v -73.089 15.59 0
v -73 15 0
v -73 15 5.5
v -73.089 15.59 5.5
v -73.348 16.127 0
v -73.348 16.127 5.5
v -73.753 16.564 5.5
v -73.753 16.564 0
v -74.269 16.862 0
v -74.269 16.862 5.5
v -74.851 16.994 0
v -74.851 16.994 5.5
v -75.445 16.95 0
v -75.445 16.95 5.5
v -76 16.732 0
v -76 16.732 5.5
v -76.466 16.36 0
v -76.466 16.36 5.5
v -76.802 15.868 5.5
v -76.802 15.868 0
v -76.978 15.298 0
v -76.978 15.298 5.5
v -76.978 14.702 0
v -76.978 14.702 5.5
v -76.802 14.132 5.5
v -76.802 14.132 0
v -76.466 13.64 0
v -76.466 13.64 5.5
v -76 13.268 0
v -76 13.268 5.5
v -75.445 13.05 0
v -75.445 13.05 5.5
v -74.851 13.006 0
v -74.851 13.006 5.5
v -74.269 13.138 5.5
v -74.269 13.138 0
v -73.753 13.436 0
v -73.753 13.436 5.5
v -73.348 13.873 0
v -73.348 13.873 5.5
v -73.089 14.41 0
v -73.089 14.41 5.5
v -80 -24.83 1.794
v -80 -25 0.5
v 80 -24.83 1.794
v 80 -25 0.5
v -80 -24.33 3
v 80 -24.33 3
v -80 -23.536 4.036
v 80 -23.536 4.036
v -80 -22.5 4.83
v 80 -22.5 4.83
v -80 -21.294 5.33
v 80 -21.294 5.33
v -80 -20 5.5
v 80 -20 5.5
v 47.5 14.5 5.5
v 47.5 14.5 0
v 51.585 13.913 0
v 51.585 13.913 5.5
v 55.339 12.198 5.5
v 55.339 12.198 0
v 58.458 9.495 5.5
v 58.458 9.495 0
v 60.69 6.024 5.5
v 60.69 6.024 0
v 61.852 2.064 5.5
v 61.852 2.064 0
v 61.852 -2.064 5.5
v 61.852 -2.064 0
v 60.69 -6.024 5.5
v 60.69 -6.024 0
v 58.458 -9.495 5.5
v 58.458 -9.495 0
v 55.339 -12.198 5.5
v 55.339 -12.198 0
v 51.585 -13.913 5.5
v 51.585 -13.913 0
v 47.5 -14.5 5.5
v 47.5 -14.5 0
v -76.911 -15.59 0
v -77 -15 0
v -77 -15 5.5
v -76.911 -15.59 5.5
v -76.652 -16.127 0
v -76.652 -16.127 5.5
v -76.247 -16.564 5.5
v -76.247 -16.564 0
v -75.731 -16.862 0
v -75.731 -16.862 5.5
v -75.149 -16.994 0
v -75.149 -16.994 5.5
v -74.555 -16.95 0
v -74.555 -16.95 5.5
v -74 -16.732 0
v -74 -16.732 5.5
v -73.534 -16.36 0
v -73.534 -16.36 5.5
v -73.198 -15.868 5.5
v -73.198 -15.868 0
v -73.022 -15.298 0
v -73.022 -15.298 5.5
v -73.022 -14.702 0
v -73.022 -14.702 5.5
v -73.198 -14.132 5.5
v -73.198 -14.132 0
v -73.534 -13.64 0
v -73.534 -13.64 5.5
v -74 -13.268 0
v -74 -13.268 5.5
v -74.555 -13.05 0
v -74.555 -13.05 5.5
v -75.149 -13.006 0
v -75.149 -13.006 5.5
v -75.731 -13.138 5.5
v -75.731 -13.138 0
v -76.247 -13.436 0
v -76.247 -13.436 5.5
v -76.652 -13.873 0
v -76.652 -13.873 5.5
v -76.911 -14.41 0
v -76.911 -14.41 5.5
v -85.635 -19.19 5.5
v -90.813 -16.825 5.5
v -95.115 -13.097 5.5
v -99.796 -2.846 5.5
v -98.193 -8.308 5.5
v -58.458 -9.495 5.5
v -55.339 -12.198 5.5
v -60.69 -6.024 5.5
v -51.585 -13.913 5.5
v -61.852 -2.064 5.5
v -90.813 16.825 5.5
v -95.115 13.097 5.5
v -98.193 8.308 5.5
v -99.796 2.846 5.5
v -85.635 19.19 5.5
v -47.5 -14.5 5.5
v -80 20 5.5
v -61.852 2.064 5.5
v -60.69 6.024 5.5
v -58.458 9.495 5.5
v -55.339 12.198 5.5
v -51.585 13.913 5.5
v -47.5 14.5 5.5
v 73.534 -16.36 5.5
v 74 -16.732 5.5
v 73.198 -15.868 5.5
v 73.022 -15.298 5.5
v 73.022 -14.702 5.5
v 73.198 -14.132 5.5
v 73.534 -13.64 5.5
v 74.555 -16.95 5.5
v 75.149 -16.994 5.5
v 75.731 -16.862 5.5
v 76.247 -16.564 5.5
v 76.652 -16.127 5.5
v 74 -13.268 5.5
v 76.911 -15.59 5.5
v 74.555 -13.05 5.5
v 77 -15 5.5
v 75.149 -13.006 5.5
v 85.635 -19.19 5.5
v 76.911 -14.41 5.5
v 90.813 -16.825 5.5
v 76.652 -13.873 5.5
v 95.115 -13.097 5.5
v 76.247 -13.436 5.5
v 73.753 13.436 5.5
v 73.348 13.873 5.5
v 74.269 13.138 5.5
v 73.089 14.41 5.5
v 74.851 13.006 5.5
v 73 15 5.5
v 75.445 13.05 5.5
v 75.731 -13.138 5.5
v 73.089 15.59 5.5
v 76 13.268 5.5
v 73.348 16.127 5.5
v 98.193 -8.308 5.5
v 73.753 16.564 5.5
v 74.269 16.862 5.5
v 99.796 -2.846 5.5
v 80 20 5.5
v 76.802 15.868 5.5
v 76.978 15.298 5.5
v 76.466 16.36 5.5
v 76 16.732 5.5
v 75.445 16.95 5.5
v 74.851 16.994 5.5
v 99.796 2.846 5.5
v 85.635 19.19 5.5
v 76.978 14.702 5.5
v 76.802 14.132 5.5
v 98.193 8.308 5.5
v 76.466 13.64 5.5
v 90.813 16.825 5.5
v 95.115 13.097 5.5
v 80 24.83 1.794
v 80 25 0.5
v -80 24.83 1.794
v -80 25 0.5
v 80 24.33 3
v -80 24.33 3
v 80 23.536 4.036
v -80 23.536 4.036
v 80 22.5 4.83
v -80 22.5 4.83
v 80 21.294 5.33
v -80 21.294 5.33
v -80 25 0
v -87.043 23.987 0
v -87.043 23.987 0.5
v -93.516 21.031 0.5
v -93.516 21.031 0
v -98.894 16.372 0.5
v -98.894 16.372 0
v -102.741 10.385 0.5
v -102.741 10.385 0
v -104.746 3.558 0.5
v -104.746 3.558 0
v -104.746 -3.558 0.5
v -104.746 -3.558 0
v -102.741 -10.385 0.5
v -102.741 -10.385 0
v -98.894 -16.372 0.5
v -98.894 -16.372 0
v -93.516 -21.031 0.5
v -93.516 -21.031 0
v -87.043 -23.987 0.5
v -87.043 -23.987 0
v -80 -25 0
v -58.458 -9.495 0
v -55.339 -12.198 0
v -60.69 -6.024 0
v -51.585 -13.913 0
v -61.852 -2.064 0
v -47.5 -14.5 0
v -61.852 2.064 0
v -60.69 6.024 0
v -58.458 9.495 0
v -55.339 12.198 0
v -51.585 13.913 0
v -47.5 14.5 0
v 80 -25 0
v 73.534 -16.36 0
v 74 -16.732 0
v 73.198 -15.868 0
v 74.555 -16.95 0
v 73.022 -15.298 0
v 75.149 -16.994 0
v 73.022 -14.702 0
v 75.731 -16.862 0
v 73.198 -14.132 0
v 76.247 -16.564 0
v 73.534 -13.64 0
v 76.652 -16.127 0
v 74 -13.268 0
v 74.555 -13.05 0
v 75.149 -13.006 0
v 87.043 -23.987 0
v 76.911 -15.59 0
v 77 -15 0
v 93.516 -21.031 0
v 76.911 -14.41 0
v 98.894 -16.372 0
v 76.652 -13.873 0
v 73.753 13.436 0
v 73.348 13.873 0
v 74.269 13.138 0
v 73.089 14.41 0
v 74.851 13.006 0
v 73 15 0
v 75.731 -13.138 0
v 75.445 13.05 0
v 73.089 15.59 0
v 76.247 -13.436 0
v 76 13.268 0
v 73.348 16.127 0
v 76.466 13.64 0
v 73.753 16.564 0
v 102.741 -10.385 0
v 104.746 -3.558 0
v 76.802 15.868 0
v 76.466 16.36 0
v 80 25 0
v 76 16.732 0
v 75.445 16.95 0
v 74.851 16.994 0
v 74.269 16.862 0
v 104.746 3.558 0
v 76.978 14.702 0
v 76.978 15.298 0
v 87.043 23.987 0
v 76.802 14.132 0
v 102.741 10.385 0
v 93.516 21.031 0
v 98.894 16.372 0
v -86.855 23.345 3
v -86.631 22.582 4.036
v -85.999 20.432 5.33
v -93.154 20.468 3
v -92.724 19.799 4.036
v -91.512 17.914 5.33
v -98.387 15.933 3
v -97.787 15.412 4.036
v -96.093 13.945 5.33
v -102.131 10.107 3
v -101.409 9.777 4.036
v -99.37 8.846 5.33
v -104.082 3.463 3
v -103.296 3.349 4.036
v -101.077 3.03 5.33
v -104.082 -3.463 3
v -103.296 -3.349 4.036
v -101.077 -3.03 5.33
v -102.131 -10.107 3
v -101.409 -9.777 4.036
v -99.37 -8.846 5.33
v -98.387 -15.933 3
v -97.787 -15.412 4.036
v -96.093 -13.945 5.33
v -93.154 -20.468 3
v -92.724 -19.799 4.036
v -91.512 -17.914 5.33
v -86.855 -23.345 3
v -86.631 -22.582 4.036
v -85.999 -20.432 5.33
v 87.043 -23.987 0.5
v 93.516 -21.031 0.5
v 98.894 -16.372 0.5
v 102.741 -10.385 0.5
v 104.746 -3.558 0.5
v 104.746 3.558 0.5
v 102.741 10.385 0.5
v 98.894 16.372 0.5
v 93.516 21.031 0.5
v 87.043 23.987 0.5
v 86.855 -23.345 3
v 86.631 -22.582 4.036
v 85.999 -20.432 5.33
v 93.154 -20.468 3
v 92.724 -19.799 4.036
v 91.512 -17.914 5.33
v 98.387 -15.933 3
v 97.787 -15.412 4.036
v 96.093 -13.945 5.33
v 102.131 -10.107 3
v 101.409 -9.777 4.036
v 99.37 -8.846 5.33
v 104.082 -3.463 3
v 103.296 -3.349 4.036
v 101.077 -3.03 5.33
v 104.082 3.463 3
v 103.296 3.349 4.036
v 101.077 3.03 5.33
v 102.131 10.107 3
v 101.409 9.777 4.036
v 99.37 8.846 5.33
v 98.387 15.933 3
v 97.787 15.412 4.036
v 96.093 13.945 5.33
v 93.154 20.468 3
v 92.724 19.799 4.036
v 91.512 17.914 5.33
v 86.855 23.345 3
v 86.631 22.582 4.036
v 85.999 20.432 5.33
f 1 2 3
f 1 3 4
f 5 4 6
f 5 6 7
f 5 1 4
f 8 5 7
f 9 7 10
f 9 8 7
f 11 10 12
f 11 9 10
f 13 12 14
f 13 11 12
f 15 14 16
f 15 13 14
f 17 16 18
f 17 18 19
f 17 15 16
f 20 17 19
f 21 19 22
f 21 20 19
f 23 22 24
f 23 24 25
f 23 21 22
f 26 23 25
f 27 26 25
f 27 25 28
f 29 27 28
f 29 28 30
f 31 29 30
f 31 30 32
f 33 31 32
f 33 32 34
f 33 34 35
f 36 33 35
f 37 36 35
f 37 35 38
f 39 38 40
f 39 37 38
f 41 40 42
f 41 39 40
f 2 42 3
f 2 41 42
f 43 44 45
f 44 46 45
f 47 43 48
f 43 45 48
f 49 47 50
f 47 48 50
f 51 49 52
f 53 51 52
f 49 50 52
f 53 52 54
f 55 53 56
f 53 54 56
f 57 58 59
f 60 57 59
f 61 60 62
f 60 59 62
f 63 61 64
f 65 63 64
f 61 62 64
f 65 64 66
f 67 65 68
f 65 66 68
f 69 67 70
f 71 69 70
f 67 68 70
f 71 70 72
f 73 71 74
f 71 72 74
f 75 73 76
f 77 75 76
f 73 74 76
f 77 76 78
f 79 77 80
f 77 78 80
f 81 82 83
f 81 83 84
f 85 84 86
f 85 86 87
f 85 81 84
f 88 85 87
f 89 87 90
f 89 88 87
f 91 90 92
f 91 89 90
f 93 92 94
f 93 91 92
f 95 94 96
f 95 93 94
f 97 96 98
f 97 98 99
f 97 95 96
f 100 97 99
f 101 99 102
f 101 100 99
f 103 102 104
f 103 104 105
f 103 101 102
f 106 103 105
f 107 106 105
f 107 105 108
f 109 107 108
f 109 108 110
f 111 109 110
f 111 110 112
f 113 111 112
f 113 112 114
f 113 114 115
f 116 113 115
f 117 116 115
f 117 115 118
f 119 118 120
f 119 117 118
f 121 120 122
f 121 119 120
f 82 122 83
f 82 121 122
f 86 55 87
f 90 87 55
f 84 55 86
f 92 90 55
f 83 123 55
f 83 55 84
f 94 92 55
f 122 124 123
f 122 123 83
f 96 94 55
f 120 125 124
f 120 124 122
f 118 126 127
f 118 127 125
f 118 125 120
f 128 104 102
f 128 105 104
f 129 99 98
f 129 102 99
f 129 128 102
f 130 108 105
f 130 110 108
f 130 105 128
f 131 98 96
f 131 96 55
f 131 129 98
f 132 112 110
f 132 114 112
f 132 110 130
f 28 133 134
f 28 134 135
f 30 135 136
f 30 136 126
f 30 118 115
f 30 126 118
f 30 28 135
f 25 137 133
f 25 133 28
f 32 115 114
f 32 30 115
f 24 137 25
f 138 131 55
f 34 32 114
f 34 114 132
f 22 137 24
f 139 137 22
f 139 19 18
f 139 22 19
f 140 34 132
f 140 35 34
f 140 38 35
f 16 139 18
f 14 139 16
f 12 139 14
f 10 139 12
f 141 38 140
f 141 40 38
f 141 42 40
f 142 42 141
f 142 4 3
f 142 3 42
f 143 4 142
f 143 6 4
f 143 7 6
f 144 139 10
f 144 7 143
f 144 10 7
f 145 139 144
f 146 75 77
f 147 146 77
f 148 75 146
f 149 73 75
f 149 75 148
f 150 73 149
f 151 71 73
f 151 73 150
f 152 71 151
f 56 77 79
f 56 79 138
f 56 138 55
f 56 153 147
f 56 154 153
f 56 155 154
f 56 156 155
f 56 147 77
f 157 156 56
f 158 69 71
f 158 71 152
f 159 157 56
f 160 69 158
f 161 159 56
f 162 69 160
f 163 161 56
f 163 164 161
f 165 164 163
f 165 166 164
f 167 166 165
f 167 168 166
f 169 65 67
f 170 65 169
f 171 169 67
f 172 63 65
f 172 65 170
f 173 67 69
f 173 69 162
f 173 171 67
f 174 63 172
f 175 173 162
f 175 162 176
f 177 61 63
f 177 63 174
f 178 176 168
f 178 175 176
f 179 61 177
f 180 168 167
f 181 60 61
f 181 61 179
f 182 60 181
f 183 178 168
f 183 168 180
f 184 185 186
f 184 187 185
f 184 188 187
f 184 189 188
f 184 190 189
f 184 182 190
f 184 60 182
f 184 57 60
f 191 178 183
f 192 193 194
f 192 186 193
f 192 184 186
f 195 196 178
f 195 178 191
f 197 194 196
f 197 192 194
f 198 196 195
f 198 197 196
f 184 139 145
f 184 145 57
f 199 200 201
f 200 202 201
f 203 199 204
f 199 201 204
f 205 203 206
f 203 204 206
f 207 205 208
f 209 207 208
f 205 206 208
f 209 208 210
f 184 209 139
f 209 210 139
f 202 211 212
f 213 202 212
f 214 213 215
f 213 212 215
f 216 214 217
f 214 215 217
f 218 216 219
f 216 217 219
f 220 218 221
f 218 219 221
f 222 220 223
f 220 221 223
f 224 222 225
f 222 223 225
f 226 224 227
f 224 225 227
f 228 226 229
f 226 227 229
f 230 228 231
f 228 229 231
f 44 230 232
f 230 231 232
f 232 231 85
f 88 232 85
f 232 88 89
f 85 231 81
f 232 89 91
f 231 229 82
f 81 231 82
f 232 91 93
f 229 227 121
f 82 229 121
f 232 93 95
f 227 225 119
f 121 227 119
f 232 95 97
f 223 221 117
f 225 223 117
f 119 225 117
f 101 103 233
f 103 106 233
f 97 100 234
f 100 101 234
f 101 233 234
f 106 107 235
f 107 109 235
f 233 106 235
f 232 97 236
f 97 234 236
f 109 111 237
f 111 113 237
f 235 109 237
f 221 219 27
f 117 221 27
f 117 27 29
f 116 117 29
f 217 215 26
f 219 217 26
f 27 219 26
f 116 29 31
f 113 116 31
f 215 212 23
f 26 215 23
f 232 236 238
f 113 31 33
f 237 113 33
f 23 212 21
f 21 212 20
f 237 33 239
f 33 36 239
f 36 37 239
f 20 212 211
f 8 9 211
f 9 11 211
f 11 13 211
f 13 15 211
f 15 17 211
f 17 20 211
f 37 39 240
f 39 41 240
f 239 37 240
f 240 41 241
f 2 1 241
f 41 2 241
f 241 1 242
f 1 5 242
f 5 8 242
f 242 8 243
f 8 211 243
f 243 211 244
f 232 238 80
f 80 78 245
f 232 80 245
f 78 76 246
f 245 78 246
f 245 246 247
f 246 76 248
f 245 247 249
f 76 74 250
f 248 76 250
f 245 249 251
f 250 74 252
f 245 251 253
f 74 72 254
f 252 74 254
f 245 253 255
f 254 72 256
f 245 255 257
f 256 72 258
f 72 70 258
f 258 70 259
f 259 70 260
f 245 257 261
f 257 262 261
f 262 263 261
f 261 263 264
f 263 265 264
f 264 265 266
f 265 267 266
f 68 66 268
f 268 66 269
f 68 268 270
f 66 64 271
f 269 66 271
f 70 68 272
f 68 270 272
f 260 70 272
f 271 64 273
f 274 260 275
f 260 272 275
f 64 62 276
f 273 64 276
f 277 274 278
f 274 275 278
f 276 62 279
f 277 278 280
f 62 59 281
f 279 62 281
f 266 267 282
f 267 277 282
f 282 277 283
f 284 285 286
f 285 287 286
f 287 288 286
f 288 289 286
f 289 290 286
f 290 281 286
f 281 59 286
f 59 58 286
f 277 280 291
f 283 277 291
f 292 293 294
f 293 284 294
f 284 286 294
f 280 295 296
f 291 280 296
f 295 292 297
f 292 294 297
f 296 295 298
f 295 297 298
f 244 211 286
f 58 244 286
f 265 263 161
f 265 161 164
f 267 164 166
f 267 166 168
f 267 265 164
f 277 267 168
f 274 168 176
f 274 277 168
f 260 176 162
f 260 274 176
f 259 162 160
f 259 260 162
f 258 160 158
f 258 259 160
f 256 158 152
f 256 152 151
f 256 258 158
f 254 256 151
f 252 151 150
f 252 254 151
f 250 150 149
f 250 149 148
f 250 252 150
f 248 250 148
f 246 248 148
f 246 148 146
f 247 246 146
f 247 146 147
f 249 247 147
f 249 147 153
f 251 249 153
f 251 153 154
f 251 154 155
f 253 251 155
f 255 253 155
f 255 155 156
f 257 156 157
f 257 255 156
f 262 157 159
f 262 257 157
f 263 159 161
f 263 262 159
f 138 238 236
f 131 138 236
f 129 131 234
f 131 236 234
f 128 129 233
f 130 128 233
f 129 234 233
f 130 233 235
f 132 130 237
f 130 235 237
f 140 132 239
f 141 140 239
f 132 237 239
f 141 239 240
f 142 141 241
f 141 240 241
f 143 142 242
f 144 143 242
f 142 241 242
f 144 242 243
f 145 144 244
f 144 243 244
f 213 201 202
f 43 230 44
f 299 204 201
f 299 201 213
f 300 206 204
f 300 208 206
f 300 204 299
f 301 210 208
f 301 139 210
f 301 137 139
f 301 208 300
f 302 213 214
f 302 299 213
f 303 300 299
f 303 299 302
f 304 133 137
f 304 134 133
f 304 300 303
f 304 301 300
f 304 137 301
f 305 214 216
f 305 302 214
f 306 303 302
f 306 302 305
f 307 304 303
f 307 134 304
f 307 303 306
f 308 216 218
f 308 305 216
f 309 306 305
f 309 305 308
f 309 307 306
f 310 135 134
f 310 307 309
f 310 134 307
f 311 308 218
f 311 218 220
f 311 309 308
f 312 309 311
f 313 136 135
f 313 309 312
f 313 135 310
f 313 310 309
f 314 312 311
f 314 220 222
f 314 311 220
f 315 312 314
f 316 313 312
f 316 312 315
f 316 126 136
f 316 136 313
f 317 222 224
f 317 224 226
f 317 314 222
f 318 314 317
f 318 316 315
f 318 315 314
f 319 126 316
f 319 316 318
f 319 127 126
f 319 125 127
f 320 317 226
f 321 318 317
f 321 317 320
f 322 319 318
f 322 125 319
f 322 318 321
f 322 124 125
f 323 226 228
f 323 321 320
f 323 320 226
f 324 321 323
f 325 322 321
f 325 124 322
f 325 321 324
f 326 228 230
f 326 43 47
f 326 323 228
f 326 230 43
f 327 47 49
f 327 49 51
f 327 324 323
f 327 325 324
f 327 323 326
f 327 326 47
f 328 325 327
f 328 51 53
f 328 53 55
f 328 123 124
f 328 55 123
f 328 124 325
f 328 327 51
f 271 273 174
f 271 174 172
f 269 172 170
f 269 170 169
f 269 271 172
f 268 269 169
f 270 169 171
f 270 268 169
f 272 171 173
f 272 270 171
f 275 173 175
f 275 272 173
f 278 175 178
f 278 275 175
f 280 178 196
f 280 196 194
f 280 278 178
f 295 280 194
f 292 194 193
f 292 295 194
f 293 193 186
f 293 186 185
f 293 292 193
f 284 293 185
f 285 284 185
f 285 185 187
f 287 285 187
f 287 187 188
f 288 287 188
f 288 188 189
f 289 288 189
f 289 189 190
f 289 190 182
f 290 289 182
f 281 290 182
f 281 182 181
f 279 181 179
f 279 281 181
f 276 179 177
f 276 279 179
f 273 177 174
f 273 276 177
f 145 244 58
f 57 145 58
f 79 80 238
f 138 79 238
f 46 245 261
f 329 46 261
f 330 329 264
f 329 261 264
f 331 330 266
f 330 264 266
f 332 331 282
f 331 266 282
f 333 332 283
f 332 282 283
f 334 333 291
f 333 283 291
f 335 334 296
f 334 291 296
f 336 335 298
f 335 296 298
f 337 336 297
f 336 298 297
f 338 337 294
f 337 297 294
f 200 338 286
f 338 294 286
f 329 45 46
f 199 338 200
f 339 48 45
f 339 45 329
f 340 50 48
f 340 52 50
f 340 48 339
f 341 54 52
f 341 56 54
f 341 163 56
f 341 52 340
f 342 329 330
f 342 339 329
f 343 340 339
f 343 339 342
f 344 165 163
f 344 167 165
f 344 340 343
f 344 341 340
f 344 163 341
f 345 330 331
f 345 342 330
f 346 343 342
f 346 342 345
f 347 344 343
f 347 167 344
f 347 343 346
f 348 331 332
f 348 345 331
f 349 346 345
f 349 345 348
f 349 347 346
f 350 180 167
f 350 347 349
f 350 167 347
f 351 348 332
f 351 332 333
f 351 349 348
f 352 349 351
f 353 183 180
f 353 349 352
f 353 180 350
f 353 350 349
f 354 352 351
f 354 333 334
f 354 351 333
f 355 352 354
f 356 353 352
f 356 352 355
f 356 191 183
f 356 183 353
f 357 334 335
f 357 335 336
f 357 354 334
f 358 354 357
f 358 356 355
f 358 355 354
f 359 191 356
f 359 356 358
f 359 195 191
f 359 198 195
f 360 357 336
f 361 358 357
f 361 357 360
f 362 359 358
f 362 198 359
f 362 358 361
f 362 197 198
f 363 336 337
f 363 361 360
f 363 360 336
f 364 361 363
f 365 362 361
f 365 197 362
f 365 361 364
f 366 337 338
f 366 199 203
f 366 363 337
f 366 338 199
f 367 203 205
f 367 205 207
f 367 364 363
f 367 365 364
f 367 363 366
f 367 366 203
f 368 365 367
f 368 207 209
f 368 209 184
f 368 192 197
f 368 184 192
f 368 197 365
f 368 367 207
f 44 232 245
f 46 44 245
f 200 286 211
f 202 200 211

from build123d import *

# Parameters (mm, degrees)
SKETCH1_R           = 2
BOSS_EXTRUDE2_DEPTH = 5.5
FILLET1_R           = 5


with BuildPart() as part:
    # Sketch1 → Boss-Extrude2 (new body)
    with BuildSketch(Plane.XY):
        with BuildLine():
            Line((-80, -25), (80, -25))
            ThreePointArc((80, -25), (105, 0), (80, 25))
            Line((80, 25), (-80, 25))
            ThreePointArc((-80, 25), (-105, 0), (-80, -25))
        make_face()
        with Locations((-75, 15)):
            Circle(SKETCH1_R, mode=Mode.SUBTRACT)
        with Locations(Location((-75, -15, 0), (0, 0, 180))):
            Circle(SKETCH1_R, mode=Mode.SUBTRACT)
        with Locations((75, -15)):
            Circle(SKETCH1_R, mode=Mode.SUBTRACT)
        with Locations(Location((75, 15, 0), (0, 0, 180))):
            Circle(SKETCH1_R, mode=Mode.SUBTRACT)
        with BuildLine():
            Line((-47.5, 14.5), (47.5, 14.5))
            ThreePointArc((47.5, 14.5), (62, 0), (47.5, -14.5))
            Line((47.5, -14.5), (-47.5, -14.5))
            ThreePointArc((-47.5, -14.5), (-62, 0), (-47.5, 14.5))
        make_face(mode=Mode.SUBTRACT)
    extrude(amount=BOSS_EXTRUDE2_DEPTH)

    # Fillet1
    fillet1_edges = [part.edges().sort_by_distance(p)[0] for p in [
        (105, 0, 5.5),
        (0, 25, 5.5),
        (-105, 0, 5.5),
        (0, -25, 5.5),
    ]]
    fillet(fillet1_edges, radius=FILLET1_R)


solid = part.part
